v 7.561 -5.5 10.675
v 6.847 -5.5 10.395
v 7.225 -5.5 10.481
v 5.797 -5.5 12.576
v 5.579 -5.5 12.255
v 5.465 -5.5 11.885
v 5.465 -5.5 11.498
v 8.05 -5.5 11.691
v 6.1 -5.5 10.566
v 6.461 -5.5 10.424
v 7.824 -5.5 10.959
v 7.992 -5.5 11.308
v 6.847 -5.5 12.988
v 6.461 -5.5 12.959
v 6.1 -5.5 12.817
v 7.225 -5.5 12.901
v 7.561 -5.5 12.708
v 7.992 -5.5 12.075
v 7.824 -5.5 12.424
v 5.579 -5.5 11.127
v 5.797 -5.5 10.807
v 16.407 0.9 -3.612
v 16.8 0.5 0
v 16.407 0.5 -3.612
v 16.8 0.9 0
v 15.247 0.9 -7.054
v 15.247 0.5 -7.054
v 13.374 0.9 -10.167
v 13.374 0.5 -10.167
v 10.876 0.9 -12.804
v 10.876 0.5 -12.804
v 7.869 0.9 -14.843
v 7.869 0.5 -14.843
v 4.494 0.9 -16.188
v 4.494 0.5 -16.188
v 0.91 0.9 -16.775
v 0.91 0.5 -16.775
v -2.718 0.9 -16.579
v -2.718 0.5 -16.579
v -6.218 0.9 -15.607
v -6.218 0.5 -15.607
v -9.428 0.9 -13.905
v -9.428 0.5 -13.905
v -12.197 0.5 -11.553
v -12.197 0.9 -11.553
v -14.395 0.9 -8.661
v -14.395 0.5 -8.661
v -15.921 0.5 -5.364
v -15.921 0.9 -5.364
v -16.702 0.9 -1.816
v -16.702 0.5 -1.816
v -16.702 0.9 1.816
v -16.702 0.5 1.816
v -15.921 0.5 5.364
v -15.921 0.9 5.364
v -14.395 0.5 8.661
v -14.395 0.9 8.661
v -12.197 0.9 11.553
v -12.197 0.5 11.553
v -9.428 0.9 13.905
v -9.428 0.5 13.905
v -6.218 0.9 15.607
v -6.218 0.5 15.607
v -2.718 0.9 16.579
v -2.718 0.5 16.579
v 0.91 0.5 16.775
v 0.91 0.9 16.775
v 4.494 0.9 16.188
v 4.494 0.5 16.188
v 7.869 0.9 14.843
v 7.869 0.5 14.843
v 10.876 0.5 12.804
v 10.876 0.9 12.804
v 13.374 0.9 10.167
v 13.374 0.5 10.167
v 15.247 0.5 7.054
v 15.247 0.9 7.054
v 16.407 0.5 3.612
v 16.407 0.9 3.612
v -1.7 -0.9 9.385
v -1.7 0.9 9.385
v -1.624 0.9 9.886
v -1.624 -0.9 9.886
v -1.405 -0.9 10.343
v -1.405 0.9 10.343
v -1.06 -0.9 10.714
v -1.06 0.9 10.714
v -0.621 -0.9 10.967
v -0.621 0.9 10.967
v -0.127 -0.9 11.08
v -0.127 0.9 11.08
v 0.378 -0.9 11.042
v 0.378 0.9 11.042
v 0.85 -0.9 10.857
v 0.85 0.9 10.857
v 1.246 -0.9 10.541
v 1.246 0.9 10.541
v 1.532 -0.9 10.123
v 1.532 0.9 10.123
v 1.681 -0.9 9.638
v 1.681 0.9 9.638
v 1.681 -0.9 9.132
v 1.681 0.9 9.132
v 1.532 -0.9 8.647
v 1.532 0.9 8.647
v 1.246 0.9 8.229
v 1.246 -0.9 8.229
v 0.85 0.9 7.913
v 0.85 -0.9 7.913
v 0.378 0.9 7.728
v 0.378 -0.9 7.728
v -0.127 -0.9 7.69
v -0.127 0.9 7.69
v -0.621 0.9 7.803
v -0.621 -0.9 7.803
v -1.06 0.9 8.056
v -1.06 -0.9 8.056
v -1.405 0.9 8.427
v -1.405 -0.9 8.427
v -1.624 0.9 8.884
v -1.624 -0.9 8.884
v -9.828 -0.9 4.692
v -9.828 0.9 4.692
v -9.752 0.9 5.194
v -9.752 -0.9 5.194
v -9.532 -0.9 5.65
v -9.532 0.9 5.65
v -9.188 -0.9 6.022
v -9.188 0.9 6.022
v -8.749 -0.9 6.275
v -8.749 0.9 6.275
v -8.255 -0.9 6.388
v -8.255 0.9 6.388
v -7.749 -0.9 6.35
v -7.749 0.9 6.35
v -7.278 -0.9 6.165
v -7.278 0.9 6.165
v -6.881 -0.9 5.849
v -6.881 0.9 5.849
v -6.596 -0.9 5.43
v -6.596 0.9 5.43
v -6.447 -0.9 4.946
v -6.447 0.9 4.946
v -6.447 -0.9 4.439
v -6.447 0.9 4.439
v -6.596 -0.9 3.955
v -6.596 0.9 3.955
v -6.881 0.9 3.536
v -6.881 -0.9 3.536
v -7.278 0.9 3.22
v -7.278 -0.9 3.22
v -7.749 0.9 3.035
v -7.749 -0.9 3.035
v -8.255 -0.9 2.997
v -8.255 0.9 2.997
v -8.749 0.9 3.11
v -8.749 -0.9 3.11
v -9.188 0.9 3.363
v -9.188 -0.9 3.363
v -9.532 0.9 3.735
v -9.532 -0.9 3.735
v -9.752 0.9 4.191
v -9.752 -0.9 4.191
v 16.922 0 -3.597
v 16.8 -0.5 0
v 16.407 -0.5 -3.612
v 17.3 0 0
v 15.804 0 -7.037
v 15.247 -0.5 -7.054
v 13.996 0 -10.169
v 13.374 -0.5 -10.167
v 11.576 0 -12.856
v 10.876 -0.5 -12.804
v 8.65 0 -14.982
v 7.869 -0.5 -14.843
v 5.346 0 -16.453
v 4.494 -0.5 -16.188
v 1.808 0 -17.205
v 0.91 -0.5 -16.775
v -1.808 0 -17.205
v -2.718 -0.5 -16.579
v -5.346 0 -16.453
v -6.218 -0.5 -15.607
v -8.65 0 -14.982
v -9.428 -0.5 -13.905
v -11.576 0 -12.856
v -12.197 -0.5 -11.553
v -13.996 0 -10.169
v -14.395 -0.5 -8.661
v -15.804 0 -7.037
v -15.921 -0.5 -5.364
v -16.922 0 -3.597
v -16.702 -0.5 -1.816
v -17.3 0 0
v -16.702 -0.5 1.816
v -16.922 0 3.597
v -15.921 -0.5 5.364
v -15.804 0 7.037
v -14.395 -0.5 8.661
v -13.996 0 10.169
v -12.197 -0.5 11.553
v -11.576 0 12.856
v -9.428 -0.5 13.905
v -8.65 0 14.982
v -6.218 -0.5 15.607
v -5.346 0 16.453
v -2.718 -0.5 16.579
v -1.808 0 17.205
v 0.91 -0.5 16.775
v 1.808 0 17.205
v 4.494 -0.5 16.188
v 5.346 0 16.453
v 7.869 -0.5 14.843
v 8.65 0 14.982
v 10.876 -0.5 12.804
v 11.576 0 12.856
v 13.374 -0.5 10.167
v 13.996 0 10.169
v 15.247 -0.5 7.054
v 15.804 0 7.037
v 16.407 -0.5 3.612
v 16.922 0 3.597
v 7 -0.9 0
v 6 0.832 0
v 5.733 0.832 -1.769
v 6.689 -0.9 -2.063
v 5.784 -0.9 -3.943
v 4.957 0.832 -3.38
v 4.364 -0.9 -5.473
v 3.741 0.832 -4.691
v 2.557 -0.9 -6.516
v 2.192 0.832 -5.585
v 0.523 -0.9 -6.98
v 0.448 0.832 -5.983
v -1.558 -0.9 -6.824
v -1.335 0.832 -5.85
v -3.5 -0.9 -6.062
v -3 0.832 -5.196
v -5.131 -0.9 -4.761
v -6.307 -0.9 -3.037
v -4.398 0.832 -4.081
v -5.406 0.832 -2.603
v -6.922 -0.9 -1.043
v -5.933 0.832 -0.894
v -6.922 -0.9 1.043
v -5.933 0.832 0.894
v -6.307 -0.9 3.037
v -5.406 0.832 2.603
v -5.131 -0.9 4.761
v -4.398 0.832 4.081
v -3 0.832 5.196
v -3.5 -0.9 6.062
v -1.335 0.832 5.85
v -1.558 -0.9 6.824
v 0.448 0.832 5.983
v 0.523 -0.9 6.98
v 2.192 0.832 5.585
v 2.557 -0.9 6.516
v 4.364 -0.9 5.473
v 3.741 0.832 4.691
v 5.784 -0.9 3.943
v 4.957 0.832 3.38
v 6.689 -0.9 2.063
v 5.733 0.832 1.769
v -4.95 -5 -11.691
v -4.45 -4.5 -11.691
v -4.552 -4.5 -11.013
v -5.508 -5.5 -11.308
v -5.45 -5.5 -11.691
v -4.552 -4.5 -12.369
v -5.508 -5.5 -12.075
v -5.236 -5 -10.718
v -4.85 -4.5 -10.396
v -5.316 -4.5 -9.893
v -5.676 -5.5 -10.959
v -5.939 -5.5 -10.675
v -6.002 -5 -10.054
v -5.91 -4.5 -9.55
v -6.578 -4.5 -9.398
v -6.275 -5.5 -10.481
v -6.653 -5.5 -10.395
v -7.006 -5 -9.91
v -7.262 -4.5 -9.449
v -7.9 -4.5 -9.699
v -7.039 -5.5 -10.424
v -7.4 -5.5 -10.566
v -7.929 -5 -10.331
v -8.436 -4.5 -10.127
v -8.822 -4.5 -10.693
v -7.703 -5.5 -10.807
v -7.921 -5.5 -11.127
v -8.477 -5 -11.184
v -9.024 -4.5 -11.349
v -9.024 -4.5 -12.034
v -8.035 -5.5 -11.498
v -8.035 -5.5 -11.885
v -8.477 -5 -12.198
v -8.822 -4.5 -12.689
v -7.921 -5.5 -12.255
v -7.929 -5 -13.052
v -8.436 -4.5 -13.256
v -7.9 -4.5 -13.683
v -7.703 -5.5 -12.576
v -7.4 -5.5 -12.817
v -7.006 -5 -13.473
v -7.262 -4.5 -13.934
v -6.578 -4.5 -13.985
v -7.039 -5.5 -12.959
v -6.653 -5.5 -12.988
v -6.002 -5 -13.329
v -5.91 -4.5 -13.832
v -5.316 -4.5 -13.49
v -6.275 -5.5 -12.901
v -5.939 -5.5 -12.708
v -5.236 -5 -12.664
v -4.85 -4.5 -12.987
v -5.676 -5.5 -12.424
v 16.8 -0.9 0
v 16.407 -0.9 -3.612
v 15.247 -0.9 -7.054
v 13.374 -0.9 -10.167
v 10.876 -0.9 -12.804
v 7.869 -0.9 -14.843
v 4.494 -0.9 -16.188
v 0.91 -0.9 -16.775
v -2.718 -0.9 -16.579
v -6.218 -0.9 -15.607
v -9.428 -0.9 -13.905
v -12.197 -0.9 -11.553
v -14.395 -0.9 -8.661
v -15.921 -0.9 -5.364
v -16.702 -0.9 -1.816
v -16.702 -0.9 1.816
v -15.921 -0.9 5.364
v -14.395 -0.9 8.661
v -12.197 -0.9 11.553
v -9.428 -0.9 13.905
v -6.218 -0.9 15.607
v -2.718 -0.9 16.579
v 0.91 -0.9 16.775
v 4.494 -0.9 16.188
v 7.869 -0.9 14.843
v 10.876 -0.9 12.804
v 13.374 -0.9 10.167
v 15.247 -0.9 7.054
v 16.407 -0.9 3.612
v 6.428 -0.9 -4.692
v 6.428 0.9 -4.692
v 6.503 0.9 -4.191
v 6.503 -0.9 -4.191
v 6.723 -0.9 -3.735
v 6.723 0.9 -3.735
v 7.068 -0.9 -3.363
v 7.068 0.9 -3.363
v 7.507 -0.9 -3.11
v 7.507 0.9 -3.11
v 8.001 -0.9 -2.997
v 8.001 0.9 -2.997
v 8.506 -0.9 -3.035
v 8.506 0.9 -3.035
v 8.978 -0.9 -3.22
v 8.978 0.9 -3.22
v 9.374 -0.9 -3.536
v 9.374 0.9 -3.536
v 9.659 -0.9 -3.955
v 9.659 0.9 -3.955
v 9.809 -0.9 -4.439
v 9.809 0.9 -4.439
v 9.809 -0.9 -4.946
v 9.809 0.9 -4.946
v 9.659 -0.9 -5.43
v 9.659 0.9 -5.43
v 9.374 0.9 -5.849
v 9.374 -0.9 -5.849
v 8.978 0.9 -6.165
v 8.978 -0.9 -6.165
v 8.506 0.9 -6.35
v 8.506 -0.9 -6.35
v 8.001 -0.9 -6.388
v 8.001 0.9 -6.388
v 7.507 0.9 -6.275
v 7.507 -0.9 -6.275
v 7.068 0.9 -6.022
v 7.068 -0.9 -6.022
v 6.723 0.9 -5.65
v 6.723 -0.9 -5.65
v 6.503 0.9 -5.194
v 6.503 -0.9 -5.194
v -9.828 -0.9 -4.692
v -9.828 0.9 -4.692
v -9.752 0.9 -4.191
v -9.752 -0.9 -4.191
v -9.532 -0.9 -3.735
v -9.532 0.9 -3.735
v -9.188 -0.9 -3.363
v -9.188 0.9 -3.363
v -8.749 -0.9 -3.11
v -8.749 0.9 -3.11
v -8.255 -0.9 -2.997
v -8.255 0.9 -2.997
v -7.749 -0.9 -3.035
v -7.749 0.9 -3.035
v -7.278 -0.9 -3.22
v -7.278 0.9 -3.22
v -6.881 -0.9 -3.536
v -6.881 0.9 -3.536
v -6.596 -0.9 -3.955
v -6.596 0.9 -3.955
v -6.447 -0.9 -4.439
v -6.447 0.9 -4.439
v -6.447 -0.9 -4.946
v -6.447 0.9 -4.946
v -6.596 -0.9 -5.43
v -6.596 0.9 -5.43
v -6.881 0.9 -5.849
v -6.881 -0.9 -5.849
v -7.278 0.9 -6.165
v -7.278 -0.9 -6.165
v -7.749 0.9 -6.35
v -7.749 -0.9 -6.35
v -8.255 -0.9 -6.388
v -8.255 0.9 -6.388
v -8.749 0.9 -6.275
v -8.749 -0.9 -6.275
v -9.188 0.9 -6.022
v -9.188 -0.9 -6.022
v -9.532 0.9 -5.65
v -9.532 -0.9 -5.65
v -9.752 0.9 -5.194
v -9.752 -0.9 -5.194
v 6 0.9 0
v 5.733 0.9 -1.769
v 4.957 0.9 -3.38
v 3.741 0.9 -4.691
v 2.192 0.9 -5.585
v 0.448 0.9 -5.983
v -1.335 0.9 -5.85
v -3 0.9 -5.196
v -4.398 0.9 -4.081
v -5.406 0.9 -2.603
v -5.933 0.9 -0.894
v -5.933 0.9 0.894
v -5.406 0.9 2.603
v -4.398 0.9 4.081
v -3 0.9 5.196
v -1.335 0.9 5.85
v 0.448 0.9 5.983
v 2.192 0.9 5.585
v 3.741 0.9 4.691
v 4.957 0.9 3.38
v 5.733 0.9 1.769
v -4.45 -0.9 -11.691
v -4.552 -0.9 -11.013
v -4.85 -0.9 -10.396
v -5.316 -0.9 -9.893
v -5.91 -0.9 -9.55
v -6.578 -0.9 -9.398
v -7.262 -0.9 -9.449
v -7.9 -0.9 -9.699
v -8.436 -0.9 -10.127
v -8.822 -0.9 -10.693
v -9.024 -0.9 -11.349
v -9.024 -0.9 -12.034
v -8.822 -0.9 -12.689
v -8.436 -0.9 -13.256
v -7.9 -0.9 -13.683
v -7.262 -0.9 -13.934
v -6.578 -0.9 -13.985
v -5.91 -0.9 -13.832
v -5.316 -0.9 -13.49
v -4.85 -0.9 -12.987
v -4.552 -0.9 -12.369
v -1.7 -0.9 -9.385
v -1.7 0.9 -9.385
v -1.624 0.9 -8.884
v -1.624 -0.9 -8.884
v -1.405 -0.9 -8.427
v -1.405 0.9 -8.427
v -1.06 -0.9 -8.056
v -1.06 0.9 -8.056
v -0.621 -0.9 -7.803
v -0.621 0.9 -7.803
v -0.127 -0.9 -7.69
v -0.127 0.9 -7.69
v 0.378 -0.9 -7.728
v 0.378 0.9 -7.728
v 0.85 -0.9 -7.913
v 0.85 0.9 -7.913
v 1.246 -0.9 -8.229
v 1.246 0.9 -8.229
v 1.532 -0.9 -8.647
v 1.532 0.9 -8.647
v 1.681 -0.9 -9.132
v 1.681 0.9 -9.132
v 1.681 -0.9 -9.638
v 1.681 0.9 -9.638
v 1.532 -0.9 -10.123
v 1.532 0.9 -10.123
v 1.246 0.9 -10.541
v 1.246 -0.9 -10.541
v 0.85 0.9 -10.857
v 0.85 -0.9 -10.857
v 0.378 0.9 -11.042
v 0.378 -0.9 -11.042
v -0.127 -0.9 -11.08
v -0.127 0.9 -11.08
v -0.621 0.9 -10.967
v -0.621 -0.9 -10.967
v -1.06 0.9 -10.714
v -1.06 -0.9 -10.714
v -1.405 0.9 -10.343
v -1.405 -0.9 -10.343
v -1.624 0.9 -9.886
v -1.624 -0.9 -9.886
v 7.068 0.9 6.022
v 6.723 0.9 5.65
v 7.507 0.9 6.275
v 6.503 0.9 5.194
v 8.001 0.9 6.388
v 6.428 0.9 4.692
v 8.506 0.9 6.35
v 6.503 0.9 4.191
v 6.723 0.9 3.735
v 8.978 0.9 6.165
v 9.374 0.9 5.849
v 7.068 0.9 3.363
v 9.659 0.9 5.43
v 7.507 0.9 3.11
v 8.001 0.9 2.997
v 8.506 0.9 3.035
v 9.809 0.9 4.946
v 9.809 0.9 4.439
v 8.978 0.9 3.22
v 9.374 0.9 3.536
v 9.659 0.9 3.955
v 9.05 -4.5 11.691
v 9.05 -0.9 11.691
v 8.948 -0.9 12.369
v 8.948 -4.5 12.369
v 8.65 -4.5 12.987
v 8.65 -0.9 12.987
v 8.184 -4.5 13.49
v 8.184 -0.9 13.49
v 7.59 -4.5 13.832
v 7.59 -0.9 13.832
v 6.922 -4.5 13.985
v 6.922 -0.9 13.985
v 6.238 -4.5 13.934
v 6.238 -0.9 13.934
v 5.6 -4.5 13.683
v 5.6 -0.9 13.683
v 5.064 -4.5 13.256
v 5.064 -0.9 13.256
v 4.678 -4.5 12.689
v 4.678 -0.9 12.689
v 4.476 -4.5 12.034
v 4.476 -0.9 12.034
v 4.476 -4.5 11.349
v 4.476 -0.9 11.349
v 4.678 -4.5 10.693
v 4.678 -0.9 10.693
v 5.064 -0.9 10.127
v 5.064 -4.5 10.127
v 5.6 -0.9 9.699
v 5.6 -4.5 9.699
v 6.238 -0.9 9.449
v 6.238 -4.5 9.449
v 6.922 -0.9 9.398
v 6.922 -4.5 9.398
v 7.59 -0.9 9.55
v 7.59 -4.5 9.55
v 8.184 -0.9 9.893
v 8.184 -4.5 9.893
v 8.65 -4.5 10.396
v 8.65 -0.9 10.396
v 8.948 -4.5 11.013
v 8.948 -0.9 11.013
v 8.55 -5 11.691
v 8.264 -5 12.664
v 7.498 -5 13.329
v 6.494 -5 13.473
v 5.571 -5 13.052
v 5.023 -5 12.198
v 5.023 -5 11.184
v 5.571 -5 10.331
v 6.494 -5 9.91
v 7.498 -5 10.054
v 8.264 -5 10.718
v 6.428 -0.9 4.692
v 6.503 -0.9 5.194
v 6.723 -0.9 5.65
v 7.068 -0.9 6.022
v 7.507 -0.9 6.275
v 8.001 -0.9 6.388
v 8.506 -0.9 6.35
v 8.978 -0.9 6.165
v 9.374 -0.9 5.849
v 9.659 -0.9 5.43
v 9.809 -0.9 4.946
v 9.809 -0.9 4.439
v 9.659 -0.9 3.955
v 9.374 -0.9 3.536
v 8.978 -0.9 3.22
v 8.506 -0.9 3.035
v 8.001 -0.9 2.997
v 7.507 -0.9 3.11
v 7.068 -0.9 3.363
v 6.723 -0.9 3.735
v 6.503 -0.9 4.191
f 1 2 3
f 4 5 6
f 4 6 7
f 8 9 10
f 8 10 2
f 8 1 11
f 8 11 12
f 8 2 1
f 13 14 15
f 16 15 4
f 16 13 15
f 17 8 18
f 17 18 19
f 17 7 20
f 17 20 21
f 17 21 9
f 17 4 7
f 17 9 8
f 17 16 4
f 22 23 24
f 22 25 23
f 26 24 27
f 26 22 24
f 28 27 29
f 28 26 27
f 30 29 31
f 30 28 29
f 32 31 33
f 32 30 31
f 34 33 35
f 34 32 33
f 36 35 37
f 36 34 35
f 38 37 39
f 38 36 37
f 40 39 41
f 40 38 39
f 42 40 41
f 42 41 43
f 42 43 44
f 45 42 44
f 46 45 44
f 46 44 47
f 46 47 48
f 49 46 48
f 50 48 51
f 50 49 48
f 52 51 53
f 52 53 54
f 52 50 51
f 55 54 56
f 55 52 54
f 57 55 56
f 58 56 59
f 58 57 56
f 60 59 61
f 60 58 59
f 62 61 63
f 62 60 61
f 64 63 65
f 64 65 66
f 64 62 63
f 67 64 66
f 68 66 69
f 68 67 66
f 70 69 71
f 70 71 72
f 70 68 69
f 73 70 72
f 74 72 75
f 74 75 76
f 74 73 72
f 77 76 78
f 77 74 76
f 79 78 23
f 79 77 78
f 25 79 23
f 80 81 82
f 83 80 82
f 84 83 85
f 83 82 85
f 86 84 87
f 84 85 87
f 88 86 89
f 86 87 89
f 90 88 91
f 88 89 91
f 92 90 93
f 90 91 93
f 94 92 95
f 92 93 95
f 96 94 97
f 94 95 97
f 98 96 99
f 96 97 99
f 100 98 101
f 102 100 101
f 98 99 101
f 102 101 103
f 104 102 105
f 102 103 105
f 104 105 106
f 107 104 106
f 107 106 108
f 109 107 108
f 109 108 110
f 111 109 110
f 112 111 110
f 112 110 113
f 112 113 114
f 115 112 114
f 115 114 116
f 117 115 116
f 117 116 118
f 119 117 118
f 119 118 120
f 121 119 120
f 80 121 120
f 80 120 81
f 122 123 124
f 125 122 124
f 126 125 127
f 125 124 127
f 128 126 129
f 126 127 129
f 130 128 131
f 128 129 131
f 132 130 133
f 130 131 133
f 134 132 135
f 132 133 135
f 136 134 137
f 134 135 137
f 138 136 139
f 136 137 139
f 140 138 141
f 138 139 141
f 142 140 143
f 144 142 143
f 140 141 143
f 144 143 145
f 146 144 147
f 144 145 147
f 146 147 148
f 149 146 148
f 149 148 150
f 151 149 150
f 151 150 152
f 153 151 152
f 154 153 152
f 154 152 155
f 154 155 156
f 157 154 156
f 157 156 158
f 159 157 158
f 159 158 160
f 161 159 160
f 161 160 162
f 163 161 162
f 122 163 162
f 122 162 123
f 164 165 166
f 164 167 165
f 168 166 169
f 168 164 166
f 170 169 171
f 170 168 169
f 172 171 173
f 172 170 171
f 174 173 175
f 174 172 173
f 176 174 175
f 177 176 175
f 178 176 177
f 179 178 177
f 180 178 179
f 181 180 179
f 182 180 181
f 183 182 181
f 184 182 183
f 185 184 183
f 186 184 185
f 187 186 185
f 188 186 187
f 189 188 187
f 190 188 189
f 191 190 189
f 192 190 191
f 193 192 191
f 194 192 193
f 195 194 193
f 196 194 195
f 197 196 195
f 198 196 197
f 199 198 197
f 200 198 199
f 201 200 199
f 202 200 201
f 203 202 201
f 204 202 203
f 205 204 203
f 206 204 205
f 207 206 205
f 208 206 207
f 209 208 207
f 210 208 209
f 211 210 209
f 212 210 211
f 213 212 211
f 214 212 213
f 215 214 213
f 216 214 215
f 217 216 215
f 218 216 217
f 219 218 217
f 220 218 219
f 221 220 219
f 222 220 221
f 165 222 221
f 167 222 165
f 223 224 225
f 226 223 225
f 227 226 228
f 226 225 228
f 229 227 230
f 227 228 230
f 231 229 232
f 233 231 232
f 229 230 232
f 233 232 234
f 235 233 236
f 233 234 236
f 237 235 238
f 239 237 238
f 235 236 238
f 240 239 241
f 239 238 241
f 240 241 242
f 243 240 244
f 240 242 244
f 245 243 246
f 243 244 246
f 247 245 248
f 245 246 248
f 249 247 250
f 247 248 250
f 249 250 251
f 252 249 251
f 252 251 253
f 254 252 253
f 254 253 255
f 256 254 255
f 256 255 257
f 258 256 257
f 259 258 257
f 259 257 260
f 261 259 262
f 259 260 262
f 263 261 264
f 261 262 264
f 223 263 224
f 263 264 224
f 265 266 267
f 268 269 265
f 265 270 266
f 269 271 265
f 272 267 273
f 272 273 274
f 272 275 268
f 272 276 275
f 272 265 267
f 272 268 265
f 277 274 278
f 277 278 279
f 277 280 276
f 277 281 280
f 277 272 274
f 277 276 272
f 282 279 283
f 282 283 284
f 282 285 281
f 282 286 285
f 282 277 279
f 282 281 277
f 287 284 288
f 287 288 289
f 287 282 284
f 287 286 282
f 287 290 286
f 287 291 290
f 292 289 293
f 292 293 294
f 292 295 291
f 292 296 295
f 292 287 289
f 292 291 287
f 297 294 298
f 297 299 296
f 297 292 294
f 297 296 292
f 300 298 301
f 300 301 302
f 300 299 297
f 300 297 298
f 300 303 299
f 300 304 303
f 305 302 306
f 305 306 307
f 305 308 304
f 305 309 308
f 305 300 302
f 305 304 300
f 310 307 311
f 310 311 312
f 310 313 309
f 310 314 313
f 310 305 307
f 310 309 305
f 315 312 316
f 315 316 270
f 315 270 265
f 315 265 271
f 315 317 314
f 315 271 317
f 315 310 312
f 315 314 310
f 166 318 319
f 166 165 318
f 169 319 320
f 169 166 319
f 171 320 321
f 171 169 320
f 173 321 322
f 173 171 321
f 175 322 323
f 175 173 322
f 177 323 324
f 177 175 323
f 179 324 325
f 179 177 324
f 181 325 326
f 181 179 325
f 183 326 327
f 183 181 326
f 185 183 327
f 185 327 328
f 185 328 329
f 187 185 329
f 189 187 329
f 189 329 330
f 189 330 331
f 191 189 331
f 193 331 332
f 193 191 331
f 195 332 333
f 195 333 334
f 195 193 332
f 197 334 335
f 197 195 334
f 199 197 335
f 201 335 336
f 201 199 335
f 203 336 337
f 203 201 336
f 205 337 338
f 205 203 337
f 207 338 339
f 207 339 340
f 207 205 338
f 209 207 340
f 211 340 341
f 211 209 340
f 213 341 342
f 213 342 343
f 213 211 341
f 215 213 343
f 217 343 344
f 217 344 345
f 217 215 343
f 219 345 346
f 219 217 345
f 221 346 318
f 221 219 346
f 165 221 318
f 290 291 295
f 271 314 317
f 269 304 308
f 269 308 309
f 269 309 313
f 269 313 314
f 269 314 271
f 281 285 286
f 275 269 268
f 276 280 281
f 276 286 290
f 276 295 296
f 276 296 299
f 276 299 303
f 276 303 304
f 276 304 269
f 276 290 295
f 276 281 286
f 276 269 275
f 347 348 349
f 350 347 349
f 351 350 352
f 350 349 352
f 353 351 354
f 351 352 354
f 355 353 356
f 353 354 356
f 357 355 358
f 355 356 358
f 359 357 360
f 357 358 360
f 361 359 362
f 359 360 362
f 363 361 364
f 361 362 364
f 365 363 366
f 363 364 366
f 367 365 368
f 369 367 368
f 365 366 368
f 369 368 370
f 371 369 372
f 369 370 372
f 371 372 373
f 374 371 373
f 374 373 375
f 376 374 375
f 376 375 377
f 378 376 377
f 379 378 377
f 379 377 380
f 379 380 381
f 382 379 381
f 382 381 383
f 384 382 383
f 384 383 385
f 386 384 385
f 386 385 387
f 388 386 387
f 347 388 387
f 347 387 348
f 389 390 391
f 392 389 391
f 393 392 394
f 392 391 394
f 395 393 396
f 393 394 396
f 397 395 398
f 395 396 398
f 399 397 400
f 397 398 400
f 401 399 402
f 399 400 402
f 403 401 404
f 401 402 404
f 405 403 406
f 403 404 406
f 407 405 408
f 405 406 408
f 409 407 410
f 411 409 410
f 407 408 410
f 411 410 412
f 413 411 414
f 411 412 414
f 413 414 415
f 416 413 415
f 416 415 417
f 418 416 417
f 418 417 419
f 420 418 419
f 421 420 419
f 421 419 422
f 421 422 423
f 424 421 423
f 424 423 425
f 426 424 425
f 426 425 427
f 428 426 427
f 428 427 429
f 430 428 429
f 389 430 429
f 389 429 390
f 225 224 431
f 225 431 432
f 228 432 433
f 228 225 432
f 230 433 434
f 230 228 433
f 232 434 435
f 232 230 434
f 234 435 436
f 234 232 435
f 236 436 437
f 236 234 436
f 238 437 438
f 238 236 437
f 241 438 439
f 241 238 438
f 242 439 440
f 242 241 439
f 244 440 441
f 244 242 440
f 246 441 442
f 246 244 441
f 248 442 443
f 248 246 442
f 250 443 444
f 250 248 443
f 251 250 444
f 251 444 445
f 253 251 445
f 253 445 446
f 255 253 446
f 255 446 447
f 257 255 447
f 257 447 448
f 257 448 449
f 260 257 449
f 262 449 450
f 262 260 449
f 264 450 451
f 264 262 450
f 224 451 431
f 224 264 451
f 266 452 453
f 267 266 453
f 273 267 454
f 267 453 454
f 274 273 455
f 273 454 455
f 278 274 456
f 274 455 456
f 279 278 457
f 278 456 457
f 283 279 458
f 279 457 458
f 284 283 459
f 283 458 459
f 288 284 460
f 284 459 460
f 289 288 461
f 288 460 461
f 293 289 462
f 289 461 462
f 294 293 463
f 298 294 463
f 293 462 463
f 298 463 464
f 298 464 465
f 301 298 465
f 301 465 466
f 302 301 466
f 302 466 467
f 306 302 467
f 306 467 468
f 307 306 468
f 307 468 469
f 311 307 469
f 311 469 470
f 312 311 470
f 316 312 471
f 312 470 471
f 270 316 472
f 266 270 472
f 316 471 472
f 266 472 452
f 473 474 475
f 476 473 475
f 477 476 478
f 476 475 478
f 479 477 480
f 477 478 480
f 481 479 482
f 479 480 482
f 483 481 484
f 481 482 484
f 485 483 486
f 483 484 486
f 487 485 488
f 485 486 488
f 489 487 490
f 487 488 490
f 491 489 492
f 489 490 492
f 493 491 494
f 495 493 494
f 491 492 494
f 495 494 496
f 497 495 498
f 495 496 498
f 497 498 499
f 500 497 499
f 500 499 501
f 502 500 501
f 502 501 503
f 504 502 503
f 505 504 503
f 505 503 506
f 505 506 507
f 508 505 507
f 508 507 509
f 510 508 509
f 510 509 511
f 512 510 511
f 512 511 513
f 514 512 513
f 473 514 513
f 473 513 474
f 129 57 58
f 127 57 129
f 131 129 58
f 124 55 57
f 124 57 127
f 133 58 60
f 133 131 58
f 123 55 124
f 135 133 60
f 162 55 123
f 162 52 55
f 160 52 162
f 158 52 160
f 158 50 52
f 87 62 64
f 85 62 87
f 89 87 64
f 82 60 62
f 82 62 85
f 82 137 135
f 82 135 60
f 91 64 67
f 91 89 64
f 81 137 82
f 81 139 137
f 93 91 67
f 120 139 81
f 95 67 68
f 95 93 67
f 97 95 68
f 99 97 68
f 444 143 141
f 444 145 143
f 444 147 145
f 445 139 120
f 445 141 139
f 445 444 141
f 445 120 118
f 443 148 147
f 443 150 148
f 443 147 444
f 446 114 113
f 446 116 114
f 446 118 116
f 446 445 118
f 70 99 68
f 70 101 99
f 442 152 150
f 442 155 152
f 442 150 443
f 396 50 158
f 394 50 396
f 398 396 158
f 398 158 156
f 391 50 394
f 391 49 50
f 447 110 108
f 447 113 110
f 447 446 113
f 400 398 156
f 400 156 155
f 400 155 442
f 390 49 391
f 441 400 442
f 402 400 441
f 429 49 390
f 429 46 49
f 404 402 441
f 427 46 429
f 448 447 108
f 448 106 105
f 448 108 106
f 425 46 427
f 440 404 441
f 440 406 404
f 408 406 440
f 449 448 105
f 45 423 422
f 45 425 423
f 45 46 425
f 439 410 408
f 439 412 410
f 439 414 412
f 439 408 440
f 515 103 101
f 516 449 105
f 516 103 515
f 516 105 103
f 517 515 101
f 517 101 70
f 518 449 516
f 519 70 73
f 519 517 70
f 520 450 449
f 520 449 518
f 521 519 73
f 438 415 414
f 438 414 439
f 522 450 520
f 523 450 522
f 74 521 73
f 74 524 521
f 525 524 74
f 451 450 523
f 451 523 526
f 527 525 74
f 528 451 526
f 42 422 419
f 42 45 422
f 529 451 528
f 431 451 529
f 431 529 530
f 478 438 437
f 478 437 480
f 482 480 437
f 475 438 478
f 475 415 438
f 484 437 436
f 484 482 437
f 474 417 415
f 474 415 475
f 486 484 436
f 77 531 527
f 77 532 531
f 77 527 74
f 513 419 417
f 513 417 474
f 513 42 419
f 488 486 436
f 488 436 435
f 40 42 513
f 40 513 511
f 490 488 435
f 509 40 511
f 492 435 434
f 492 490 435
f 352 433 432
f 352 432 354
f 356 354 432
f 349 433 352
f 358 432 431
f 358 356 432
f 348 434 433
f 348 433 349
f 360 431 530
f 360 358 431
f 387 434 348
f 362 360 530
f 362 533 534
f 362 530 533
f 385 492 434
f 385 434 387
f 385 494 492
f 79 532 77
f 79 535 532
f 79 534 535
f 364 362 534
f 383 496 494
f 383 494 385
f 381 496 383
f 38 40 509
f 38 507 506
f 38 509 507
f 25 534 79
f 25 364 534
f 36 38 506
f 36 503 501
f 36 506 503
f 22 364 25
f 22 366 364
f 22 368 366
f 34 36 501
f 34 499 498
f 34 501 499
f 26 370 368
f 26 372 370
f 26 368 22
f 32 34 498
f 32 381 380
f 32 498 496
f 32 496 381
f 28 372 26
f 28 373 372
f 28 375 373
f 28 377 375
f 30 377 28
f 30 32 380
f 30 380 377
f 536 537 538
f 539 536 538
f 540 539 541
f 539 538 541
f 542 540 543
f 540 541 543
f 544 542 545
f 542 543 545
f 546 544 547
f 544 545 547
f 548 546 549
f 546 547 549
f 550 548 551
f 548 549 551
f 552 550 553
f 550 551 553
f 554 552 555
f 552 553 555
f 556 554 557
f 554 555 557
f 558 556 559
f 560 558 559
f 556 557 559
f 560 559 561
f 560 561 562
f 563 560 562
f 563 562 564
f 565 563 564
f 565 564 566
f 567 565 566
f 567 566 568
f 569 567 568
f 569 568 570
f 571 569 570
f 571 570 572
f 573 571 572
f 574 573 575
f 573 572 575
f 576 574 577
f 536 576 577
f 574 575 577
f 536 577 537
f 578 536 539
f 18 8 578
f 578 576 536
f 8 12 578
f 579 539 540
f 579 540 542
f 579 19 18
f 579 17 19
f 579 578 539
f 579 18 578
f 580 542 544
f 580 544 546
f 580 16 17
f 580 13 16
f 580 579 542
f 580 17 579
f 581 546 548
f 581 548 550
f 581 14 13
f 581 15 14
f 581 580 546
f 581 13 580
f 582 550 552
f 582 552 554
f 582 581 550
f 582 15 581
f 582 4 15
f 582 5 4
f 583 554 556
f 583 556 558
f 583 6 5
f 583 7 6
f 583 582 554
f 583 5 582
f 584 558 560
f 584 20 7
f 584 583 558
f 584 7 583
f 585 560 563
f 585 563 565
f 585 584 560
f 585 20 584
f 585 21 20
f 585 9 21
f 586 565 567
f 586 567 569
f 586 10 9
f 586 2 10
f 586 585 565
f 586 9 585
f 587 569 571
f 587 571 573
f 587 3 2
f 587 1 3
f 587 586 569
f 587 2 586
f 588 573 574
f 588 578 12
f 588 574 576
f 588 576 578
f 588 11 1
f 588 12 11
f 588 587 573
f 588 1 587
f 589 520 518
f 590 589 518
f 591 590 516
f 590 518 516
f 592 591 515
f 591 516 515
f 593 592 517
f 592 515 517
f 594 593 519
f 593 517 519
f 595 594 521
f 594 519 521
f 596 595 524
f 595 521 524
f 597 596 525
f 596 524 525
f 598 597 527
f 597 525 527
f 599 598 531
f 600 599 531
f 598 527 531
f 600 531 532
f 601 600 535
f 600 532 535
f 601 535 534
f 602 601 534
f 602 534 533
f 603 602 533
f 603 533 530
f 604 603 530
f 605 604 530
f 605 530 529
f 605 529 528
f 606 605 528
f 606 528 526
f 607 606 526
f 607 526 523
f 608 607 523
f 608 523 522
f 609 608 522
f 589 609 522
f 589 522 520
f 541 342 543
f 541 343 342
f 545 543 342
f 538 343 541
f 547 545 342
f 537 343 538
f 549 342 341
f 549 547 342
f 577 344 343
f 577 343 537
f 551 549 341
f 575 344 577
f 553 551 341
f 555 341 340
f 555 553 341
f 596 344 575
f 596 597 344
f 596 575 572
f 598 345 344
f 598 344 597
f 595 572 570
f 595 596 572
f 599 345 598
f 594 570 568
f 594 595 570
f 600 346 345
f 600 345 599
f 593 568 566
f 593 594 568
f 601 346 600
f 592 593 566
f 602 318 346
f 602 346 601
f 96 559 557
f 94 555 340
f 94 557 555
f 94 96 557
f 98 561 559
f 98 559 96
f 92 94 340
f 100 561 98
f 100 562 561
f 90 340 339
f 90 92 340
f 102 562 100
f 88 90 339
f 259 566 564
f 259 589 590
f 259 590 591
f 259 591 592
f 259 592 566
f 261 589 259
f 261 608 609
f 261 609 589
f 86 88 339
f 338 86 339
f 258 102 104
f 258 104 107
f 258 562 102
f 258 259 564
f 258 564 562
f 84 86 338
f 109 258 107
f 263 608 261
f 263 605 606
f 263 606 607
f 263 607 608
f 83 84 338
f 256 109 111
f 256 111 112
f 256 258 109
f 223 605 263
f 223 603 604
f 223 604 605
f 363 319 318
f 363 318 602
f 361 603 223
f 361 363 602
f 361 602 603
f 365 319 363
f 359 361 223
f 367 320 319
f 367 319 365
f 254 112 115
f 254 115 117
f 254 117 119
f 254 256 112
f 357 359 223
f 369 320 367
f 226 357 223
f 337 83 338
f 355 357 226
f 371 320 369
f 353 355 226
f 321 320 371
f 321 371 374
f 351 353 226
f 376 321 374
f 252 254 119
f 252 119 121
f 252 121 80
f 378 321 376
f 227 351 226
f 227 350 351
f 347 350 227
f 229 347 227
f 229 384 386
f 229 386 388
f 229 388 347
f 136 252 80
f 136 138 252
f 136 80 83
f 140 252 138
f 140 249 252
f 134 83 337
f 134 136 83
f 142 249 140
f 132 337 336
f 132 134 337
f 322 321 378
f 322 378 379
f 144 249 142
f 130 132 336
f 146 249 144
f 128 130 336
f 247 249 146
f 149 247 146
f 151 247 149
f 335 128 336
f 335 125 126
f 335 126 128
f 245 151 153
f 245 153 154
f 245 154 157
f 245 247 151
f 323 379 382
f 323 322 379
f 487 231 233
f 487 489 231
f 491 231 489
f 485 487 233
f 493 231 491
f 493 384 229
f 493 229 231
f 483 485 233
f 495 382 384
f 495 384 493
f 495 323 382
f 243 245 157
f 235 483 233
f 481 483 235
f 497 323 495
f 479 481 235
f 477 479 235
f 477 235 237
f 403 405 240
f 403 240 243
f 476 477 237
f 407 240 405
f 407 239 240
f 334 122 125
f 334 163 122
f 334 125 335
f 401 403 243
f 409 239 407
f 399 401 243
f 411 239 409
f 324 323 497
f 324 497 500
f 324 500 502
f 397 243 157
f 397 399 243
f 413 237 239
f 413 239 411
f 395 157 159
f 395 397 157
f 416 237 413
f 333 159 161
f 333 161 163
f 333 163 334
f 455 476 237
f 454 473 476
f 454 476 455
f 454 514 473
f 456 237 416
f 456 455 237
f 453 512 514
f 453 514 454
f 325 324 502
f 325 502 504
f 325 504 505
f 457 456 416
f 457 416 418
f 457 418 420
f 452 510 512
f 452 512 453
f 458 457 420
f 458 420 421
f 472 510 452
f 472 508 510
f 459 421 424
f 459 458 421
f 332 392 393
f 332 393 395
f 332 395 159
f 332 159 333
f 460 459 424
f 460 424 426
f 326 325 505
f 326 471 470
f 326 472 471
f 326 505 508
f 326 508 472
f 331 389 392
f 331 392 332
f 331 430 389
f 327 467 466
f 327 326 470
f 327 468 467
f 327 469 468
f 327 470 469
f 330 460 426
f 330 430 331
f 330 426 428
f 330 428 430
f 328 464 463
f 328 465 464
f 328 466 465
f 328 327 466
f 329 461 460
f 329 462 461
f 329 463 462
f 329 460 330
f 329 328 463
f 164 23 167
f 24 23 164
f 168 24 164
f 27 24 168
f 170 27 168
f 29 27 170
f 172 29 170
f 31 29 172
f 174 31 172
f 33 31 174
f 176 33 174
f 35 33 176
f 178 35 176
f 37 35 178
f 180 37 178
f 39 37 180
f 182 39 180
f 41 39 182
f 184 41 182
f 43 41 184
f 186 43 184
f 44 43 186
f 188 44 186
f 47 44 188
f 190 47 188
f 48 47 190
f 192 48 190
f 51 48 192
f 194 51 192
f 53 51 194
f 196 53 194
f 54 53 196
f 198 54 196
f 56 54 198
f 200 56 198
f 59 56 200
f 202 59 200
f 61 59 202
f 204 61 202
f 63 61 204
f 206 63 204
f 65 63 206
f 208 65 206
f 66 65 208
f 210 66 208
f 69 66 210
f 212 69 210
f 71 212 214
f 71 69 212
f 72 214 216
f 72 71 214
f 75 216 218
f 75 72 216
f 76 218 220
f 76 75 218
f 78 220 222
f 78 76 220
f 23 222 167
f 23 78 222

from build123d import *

# Parameters (mm, degrees)
SKETCH2_R           = 1.7
CUT_EXTRUDE1_DEPTH  = 25.532019892
SKETCH3_R           = 2.3
BOSS_EXTRUDE1_DEPTH = 4.6
CHAMFER1_SIZE       = 1
CHAMFER2_SIZE       = 1
CHAMFER2_SIZE2      = 1.732050808


with BuildPart() as part:
    # Sketch1 → Revolve1 (revolve)
    with BuildSketch(Plane.XY):
        Polygon((6, -0.9), (16.8, -0.9), (16.8, -0.5), (17.3, 0), (16.8, 0.5), (16.8, 0.9), (6, 0.9), align=None)
    revolve(axis=Axis((0, -175.207382849, 0), (0, 1, 0)))

    # Sketch2 → Cut-Extrude1 (cut, through all)
    with BuildSketch(Plane(origin=(0, 0.9, 0), x_dir=(1, 0, 0), z_dir=(0, 1, 0))):
        with Locations(Location((0, 9.385, 0), (0, 0, 180))):
            Circle(SKETCH2_R)
        with Locations(Location((8.127648415, 4.6925, 0), (0, 0, 180))):
            Circle(SKETCH2_R)
        with Locations(Location((8.127648415, -4.6925, 0), (0, 0, 180))):
            Circle(SKETCH2_R)
        with Locations(Location((0, -9.385, 0), (0, 0, 180))):
            Circle(SKETCH2_R)
        with Locations(Location((-8.127648415, -4.6925, 0), (0, 0, 180))):
            Circle(SKETCH2_R)
        with Locations(Location((-8.127648415, 4.6925, 0), (0, 0, 180))):
            Circle(SKETCH2_R)
    extrude(amount=-CUT_EXTRUDE1_DEPTH, mode=Mode.SUBTRACT)

    # Sketch3 → Boss-Extrude1 (add)
    with BuildSketch(Plane.XZ.offset(0.9)):
        with Locations((6.75, 11.691342951)):
            Circle(SKETCH3_R)
        with Locations((-6.75, -11.691342951)):
            Circle(SKETCH3_R)
    extrude(amount=BOSS_EXTRUDE1_DEPTH)

    # Chamfer1
    chamfer1_edges = [part.edges().sort_by_distance(p)[0] for p in [
        (4.45, -5.5, 11.691342951),
        (-9.05, -5.5, -11.691342951),
    ]]
    chamfer(chamfer1_edges, length=CHAMFER1_SIZE)

    # Chamfer2
    chamfer2_edges = [part.edges().sort_by_distance(p)[0] for p in [
        (-6, -0.9, 0),
    ]]
    chamfer2_side = [part.faces().sort_by_distance(p)[0] for p in [
        (-16.324824243, -0.9, 0),
    ]]
    chamfer(chamfer2_edges, length=CHAMFER2_SIZE, length2=CHAMFER2_SIZE2, reference=chamfer2_side[0])


solid = part.part
